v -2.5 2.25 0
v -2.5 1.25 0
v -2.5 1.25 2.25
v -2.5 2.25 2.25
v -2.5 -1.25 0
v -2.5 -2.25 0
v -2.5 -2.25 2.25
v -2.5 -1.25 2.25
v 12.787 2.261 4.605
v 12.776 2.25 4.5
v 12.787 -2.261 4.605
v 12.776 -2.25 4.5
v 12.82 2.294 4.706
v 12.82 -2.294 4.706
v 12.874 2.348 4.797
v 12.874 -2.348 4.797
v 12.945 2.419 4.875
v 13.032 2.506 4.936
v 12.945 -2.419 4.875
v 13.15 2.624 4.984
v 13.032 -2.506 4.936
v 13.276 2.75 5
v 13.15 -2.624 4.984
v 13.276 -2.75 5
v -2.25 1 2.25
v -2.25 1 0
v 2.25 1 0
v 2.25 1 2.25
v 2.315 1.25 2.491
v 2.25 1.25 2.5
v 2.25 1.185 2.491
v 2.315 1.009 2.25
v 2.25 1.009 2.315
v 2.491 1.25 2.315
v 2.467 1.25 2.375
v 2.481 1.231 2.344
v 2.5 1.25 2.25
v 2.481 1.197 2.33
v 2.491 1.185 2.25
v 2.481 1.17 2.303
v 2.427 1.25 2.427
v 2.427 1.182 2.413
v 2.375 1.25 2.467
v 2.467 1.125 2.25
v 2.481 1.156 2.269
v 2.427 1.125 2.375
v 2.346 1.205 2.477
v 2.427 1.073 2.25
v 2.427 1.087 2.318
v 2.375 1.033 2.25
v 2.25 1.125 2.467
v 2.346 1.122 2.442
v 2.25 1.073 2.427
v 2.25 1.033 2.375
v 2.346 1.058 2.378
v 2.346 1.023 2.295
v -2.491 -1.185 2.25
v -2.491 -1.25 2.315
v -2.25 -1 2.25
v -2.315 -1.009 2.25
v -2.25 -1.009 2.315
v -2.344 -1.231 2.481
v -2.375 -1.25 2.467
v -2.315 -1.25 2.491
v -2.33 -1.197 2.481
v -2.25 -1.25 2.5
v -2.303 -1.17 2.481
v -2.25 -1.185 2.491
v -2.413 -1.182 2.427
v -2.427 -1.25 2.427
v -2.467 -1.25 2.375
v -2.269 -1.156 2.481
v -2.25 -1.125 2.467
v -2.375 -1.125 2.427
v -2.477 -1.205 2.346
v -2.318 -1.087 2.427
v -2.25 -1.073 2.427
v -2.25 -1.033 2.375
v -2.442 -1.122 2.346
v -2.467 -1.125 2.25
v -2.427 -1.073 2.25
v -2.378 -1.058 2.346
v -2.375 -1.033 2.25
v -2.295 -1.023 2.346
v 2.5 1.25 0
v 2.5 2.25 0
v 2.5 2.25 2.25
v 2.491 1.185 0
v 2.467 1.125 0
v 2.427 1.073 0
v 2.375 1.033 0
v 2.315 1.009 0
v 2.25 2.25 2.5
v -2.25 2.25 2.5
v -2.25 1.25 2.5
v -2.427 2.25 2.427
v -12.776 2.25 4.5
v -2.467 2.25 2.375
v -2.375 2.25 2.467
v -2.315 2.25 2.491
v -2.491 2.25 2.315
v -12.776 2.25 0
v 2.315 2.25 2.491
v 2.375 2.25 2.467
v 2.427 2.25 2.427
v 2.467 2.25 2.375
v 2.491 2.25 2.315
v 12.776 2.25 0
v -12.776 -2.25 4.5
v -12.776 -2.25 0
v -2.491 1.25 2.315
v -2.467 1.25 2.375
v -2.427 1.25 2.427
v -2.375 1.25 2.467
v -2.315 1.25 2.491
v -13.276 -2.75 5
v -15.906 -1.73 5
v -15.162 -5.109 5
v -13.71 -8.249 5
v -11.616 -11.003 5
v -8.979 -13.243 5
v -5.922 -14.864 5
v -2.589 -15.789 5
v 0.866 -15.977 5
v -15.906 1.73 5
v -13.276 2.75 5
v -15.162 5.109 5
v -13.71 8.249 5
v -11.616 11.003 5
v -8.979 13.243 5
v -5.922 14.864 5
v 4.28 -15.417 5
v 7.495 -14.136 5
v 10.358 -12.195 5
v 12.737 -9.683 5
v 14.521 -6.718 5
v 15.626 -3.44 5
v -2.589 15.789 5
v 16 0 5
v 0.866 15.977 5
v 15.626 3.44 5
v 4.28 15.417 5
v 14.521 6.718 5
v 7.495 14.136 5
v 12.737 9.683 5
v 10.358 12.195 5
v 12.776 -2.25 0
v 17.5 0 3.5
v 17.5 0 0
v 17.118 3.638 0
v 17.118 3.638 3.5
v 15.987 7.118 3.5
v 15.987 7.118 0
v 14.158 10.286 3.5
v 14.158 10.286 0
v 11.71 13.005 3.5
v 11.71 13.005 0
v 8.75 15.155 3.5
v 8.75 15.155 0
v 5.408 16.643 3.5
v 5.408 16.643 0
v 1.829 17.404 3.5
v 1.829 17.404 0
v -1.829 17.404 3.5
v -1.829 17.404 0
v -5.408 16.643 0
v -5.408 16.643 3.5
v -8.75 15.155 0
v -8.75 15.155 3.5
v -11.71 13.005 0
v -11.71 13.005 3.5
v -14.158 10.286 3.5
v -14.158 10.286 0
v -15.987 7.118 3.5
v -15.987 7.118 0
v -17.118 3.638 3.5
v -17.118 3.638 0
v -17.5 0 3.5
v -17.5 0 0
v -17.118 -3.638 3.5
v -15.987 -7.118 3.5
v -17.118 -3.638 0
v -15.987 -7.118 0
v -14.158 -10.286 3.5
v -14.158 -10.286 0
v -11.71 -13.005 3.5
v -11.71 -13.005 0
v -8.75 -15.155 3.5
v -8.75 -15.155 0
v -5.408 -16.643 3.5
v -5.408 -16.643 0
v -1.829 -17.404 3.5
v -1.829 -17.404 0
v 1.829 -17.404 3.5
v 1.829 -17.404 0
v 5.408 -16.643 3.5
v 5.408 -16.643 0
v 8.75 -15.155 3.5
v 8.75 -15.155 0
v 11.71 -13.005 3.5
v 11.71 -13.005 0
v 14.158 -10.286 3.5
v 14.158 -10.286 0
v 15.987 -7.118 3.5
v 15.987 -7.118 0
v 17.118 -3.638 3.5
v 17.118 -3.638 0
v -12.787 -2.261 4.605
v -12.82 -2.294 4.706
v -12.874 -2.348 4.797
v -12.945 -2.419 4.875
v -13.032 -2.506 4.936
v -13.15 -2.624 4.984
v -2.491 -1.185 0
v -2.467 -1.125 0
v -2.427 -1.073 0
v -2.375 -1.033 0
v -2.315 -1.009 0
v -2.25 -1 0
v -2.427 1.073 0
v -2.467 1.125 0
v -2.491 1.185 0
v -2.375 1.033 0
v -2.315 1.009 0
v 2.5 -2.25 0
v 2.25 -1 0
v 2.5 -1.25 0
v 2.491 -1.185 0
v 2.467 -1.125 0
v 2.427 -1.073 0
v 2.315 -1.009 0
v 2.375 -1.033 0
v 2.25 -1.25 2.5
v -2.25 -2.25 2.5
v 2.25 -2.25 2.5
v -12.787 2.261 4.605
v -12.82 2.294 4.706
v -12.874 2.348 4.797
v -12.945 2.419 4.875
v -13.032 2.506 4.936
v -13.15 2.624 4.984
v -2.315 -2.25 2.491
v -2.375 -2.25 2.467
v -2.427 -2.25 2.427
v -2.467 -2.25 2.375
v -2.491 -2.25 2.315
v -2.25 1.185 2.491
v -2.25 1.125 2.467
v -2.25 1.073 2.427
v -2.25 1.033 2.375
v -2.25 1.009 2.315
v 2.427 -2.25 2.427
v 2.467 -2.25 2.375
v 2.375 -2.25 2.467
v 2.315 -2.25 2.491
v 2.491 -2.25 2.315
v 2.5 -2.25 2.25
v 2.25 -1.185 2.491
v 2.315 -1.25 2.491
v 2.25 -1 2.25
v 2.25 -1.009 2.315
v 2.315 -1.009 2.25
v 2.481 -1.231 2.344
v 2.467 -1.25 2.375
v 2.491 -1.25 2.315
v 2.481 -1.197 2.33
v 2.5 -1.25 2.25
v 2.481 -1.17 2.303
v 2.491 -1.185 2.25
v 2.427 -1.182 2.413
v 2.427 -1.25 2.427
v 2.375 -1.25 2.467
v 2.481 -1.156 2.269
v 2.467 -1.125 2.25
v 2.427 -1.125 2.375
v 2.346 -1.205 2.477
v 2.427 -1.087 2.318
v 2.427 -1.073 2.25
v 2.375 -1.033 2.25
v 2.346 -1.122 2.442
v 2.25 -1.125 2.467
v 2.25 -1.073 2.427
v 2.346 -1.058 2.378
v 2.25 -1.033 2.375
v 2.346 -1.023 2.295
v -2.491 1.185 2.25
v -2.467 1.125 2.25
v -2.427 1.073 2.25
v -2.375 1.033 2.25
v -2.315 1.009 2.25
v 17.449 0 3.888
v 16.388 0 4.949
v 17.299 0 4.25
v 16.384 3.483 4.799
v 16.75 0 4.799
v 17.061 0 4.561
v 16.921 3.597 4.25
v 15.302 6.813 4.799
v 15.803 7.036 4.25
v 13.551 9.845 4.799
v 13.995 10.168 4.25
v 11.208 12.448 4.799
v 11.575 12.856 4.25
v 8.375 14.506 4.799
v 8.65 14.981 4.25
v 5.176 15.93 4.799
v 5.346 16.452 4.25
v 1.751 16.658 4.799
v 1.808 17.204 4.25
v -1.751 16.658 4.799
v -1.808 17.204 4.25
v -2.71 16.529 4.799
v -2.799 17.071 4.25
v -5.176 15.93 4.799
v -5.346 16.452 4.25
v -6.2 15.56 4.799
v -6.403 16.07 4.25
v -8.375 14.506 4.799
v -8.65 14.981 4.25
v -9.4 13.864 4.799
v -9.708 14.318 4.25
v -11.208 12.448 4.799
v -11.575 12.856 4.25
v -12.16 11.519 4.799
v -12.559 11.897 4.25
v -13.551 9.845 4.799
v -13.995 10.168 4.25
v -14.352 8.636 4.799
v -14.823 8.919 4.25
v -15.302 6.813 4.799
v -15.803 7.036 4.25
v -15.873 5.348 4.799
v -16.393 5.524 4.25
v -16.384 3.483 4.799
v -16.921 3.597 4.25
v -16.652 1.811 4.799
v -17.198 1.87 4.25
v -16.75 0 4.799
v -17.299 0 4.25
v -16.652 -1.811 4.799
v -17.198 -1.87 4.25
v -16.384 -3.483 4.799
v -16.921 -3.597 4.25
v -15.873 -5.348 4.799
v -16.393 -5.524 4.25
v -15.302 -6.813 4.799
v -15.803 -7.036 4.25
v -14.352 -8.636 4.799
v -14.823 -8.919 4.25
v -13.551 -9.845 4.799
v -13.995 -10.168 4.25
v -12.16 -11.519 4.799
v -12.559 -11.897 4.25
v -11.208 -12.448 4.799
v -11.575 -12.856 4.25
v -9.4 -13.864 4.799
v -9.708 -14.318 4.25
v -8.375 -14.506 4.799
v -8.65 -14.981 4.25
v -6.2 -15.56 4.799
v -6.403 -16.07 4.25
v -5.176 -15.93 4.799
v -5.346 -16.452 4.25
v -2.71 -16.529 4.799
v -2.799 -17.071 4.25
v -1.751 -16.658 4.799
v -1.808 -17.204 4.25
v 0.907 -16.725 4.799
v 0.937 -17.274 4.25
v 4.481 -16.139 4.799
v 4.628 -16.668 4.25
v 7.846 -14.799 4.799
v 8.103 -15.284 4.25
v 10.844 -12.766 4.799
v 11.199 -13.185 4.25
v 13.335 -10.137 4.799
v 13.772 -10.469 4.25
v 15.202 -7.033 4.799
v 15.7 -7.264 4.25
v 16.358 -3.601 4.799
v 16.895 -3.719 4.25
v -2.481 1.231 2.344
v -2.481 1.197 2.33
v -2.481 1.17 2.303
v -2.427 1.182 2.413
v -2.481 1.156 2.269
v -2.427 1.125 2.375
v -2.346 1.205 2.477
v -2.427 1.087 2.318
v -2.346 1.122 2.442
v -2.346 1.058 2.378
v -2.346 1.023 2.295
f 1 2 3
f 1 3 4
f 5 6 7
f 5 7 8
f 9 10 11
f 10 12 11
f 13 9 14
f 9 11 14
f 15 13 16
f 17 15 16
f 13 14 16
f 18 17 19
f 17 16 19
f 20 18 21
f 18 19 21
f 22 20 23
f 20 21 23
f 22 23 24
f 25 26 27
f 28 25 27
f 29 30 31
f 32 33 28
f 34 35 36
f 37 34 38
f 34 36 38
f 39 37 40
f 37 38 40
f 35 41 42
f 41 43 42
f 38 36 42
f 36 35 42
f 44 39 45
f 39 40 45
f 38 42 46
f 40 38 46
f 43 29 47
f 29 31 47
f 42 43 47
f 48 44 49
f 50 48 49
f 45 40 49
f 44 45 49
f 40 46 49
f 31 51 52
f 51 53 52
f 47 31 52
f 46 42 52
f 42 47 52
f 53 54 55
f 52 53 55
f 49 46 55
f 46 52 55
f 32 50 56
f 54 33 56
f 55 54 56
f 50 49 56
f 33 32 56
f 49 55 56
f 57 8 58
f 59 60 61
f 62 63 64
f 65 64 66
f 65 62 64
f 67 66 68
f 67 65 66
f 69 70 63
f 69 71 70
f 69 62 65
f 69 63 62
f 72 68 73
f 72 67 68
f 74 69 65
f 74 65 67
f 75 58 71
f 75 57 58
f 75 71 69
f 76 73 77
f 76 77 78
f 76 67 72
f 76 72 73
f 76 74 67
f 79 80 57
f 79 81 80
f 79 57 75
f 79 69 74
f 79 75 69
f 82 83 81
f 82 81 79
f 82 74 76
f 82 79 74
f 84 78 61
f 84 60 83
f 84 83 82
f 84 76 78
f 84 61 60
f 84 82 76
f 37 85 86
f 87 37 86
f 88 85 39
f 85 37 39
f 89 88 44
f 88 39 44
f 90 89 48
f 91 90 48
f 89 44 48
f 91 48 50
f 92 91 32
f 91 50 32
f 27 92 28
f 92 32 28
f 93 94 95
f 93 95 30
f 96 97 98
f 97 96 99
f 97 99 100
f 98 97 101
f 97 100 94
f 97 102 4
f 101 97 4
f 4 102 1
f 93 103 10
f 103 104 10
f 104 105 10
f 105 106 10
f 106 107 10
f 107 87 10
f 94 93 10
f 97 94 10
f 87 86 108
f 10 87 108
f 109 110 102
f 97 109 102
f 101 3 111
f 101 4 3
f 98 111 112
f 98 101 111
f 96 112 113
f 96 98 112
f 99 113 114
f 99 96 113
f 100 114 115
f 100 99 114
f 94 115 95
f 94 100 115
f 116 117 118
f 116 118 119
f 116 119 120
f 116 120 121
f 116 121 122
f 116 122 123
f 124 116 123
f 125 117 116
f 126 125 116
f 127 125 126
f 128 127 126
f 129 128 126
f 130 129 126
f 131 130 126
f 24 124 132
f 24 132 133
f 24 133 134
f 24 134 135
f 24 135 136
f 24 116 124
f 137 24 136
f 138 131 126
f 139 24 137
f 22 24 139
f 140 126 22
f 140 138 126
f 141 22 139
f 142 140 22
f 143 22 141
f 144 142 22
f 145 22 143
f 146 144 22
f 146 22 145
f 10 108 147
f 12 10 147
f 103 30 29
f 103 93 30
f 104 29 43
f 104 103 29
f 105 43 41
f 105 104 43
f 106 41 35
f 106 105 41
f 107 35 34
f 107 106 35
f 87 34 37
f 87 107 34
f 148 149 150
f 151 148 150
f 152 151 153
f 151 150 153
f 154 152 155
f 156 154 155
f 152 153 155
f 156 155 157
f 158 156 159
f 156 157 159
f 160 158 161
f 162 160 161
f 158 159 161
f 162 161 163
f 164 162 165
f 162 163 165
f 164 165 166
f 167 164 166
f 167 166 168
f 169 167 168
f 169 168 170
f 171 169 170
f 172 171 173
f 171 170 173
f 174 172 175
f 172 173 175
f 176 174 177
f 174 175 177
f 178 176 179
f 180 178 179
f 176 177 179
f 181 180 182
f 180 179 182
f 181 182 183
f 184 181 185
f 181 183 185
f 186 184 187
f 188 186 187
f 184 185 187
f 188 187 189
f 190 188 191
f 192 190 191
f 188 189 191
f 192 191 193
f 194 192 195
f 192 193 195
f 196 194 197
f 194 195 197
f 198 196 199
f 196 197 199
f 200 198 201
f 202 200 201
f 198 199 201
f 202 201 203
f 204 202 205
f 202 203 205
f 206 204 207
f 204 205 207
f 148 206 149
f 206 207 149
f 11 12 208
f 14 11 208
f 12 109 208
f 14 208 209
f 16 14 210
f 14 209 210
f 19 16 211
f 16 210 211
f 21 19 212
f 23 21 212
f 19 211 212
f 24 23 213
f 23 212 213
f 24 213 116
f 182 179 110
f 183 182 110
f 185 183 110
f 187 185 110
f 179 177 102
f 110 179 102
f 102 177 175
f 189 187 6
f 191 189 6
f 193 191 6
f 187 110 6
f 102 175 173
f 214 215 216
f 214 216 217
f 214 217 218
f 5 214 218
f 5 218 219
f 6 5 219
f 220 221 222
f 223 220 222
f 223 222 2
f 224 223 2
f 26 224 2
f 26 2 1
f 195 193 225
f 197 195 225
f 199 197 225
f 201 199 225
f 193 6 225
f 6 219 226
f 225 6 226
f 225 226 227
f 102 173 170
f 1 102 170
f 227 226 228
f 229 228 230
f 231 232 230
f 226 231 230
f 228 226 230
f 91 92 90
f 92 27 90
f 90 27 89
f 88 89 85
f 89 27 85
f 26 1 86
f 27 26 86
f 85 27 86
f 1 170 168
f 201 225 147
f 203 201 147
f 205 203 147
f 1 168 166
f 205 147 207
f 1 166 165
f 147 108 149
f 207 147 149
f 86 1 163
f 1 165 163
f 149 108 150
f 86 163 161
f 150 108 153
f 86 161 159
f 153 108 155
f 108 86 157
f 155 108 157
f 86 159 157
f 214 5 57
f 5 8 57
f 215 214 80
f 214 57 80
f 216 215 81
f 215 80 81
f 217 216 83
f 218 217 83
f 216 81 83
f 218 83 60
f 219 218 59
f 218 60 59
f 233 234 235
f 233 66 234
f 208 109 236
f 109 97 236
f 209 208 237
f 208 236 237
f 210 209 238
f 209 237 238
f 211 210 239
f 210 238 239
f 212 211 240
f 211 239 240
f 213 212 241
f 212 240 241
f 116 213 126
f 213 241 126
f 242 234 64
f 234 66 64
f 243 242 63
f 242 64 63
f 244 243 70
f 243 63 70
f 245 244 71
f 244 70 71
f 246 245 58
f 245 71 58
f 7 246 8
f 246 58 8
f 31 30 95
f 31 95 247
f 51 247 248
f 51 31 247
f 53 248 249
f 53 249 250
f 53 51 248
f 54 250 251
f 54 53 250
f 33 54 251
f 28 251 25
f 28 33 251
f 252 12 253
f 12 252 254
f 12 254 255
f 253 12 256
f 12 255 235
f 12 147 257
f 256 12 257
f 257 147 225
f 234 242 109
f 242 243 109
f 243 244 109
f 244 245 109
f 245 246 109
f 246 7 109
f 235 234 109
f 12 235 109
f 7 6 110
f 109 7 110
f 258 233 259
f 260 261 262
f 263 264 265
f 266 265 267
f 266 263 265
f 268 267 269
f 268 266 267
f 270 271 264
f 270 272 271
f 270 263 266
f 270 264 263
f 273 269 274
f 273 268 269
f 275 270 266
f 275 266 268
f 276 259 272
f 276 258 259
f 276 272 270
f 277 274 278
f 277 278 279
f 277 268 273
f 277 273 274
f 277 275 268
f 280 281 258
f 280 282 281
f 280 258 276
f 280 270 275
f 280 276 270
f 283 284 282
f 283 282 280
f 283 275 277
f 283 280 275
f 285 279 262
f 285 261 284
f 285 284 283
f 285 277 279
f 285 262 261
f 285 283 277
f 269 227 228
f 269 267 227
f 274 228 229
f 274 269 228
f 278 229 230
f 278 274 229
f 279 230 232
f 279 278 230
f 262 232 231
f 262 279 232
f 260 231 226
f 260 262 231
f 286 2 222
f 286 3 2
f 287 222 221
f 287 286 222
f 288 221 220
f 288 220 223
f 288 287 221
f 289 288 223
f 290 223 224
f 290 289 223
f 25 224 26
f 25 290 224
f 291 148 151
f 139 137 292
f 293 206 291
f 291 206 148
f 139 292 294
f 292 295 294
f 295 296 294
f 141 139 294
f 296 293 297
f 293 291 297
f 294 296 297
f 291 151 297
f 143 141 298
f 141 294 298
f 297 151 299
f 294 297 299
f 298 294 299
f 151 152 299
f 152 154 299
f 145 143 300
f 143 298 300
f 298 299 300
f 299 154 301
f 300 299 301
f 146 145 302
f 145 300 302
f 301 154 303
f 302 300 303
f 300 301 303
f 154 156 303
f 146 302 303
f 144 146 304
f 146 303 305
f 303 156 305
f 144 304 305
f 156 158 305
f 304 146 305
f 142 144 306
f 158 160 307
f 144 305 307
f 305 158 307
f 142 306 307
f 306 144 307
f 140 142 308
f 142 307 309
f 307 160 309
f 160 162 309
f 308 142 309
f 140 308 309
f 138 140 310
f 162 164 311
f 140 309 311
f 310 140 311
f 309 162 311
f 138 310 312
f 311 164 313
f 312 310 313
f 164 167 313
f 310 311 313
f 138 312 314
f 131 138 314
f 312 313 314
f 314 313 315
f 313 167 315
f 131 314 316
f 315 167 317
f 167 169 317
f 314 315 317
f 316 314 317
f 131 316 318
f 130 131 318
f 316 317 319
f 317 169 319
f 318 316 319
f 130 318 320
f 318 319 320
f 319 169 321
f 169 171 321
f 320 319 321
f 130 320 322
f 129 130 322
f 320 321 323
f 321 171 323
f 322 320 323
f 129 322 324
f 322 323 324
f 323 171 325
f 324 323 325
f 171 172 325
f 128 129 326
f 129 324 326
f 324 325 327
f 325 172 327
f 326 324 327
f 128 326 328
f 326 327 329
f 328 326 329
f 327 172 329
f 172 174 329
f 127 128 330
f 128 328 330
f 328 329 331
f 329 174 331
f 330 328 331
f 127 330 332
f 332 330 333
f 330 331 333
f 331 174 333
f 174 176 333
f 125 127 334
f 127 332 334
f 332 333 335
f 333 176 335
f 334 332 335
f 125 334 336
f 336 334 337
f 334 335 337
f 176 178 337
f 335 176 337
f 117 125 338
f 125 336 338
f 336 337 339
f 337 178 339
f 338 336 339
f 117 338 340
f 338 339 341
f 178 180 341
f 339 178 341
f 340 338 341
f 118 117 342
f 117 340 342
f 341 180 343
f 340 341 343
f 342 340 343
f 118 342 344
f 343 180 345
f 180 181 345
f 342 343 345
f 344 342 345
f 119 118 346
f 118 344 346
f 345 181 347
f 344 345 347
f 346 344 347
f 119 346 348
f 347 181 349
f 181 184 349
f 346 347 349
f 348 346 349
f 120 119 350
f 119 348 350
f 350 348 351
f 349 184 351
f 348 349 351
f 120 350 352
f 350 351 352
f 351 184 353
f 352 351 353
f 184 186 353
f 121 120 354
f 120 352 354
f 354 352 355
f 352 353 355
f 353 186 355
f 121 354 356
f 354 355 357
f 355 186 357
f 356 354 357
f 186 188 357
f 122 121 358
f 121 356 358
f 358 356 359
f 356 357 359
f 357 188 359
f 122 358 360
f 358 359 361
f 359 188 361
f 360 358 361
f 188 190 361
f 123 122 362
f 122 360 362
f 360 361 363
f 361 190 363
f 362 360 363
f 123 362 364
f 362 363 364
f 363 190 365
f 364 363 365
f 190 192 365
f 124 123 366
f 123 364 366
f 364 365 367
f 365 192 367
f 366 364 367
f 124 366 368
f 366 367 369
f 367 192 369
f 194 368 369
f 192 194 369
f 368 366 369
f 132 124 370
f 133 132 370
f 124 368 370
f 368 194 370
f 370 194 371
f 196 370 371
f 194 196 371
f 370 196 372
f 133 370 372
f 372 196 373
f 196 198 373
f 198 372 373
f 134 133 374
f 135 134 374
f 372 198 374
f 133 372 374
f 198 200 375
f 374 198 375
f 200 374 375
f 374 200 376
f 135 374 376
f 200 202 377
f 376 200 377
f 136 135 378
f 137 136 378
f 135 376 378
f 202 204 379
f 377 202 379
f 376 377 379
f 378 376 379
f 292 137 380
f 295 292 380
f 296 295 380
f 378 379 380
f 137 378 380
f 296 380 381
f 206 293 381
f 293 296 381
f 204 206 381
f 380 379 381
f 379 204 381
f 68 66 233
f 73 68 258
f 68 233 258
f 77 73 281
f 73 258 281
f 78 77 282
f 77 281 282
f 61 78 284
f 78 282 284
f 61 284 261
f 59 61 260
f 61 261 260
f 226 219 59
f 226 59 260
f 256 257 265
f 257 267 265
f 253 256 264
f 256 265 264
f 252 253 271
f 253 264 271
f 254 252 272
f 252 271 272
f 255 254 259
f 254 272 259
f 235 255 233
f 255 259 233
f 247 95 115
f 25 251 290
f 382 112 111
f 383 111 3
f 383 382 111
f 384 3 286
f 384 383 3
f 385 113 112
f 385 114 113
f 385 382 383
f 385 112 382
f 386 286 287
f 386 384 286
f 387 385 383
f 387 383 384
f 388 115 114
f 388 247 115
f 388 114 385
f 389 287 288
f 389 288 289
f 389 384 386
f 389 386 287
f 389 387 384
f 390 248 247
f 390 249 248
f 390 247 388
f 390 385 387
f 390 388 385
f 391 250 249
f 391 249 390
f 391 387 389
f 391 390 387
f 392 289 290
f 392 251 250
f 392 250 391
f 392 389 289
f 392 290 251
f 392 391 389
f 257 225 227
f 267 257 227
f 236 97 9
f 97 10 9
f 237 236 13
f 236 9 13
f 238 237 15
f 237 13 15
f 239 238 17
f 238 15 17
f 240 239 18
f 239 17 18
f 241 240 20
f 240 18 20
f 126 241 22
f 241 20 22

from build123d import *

# Parameters (mm, degrees)
F0_R     = 17.5
F1_DEPTH = 5
F0_W     = 5
F0_H     = 1.25
F2_DEPTH = 2.5
F3_R     = 0.25
F4_R     = 0.5
F5_R     = 1.5


with BuildPart() as f1:
    # F0 (on Top) → F1 (new body)
    with BuildSketch(Plane.XY):
        Circle(F0_R)
        Polygon((-12.776, -2.25), (-12.776, 2.25), (-2.5, 2.25), (2.5, 2.25), (12.776, 2.25), (12.776, -2.25), (2.5, -2.25), (-2.5, -2.25), align=None, mode=Mode.SUBTRACT)
    extrude(amount=F1_DEPTH)

    # F0 (on Top) → F2 (join)
    with BuildSketch(Plane.XY):
        with Locations((0, 1.625)):
            Rectangle(F0_W, F0_H)
        with Locations((0, -1.625)):
            Rectangle(F0_W, F0_H)
    extrude(amount=F2_DEPTH)

    # F3
    f3_edges = [f1.edges().sort_by_distance(p)[0] for p in [
        (-2.5, -1, 1.25),
        (-2.5, -1.625, 2.5),
        (0, -1, 2.5),
        (2.5, -1.625, 2.5),
        (0, 1, 2.5),
        (2.5, 1.625, 2.5),
        (-2.5, 1.625, 2.5),
        (-2.5, 1, 1.25),
        (2.5, -1, 1.25),
        (2.5, 1, 1.25),
    ]]
    fillet(f3_edges, radius=F3_R)

    # F4
    f4_edges = [f1.edges().sort_by_distance(p)[0] for p in [
        (0, 2.25, 5),
        (12.776, 0, 5),
        (0, -2.25, 5),
        (-12.776, 0, 5),
    ]]
    fillet(f4_edges, radius=F4_R)

    # F5
    f5_edges = [f1.edges().sort_by_distance(p)[0] for p in [
        (-17.5, 0, 5),
    ]]
    fillet(f5_edges, radius=F5_R)


solid = f1.part
